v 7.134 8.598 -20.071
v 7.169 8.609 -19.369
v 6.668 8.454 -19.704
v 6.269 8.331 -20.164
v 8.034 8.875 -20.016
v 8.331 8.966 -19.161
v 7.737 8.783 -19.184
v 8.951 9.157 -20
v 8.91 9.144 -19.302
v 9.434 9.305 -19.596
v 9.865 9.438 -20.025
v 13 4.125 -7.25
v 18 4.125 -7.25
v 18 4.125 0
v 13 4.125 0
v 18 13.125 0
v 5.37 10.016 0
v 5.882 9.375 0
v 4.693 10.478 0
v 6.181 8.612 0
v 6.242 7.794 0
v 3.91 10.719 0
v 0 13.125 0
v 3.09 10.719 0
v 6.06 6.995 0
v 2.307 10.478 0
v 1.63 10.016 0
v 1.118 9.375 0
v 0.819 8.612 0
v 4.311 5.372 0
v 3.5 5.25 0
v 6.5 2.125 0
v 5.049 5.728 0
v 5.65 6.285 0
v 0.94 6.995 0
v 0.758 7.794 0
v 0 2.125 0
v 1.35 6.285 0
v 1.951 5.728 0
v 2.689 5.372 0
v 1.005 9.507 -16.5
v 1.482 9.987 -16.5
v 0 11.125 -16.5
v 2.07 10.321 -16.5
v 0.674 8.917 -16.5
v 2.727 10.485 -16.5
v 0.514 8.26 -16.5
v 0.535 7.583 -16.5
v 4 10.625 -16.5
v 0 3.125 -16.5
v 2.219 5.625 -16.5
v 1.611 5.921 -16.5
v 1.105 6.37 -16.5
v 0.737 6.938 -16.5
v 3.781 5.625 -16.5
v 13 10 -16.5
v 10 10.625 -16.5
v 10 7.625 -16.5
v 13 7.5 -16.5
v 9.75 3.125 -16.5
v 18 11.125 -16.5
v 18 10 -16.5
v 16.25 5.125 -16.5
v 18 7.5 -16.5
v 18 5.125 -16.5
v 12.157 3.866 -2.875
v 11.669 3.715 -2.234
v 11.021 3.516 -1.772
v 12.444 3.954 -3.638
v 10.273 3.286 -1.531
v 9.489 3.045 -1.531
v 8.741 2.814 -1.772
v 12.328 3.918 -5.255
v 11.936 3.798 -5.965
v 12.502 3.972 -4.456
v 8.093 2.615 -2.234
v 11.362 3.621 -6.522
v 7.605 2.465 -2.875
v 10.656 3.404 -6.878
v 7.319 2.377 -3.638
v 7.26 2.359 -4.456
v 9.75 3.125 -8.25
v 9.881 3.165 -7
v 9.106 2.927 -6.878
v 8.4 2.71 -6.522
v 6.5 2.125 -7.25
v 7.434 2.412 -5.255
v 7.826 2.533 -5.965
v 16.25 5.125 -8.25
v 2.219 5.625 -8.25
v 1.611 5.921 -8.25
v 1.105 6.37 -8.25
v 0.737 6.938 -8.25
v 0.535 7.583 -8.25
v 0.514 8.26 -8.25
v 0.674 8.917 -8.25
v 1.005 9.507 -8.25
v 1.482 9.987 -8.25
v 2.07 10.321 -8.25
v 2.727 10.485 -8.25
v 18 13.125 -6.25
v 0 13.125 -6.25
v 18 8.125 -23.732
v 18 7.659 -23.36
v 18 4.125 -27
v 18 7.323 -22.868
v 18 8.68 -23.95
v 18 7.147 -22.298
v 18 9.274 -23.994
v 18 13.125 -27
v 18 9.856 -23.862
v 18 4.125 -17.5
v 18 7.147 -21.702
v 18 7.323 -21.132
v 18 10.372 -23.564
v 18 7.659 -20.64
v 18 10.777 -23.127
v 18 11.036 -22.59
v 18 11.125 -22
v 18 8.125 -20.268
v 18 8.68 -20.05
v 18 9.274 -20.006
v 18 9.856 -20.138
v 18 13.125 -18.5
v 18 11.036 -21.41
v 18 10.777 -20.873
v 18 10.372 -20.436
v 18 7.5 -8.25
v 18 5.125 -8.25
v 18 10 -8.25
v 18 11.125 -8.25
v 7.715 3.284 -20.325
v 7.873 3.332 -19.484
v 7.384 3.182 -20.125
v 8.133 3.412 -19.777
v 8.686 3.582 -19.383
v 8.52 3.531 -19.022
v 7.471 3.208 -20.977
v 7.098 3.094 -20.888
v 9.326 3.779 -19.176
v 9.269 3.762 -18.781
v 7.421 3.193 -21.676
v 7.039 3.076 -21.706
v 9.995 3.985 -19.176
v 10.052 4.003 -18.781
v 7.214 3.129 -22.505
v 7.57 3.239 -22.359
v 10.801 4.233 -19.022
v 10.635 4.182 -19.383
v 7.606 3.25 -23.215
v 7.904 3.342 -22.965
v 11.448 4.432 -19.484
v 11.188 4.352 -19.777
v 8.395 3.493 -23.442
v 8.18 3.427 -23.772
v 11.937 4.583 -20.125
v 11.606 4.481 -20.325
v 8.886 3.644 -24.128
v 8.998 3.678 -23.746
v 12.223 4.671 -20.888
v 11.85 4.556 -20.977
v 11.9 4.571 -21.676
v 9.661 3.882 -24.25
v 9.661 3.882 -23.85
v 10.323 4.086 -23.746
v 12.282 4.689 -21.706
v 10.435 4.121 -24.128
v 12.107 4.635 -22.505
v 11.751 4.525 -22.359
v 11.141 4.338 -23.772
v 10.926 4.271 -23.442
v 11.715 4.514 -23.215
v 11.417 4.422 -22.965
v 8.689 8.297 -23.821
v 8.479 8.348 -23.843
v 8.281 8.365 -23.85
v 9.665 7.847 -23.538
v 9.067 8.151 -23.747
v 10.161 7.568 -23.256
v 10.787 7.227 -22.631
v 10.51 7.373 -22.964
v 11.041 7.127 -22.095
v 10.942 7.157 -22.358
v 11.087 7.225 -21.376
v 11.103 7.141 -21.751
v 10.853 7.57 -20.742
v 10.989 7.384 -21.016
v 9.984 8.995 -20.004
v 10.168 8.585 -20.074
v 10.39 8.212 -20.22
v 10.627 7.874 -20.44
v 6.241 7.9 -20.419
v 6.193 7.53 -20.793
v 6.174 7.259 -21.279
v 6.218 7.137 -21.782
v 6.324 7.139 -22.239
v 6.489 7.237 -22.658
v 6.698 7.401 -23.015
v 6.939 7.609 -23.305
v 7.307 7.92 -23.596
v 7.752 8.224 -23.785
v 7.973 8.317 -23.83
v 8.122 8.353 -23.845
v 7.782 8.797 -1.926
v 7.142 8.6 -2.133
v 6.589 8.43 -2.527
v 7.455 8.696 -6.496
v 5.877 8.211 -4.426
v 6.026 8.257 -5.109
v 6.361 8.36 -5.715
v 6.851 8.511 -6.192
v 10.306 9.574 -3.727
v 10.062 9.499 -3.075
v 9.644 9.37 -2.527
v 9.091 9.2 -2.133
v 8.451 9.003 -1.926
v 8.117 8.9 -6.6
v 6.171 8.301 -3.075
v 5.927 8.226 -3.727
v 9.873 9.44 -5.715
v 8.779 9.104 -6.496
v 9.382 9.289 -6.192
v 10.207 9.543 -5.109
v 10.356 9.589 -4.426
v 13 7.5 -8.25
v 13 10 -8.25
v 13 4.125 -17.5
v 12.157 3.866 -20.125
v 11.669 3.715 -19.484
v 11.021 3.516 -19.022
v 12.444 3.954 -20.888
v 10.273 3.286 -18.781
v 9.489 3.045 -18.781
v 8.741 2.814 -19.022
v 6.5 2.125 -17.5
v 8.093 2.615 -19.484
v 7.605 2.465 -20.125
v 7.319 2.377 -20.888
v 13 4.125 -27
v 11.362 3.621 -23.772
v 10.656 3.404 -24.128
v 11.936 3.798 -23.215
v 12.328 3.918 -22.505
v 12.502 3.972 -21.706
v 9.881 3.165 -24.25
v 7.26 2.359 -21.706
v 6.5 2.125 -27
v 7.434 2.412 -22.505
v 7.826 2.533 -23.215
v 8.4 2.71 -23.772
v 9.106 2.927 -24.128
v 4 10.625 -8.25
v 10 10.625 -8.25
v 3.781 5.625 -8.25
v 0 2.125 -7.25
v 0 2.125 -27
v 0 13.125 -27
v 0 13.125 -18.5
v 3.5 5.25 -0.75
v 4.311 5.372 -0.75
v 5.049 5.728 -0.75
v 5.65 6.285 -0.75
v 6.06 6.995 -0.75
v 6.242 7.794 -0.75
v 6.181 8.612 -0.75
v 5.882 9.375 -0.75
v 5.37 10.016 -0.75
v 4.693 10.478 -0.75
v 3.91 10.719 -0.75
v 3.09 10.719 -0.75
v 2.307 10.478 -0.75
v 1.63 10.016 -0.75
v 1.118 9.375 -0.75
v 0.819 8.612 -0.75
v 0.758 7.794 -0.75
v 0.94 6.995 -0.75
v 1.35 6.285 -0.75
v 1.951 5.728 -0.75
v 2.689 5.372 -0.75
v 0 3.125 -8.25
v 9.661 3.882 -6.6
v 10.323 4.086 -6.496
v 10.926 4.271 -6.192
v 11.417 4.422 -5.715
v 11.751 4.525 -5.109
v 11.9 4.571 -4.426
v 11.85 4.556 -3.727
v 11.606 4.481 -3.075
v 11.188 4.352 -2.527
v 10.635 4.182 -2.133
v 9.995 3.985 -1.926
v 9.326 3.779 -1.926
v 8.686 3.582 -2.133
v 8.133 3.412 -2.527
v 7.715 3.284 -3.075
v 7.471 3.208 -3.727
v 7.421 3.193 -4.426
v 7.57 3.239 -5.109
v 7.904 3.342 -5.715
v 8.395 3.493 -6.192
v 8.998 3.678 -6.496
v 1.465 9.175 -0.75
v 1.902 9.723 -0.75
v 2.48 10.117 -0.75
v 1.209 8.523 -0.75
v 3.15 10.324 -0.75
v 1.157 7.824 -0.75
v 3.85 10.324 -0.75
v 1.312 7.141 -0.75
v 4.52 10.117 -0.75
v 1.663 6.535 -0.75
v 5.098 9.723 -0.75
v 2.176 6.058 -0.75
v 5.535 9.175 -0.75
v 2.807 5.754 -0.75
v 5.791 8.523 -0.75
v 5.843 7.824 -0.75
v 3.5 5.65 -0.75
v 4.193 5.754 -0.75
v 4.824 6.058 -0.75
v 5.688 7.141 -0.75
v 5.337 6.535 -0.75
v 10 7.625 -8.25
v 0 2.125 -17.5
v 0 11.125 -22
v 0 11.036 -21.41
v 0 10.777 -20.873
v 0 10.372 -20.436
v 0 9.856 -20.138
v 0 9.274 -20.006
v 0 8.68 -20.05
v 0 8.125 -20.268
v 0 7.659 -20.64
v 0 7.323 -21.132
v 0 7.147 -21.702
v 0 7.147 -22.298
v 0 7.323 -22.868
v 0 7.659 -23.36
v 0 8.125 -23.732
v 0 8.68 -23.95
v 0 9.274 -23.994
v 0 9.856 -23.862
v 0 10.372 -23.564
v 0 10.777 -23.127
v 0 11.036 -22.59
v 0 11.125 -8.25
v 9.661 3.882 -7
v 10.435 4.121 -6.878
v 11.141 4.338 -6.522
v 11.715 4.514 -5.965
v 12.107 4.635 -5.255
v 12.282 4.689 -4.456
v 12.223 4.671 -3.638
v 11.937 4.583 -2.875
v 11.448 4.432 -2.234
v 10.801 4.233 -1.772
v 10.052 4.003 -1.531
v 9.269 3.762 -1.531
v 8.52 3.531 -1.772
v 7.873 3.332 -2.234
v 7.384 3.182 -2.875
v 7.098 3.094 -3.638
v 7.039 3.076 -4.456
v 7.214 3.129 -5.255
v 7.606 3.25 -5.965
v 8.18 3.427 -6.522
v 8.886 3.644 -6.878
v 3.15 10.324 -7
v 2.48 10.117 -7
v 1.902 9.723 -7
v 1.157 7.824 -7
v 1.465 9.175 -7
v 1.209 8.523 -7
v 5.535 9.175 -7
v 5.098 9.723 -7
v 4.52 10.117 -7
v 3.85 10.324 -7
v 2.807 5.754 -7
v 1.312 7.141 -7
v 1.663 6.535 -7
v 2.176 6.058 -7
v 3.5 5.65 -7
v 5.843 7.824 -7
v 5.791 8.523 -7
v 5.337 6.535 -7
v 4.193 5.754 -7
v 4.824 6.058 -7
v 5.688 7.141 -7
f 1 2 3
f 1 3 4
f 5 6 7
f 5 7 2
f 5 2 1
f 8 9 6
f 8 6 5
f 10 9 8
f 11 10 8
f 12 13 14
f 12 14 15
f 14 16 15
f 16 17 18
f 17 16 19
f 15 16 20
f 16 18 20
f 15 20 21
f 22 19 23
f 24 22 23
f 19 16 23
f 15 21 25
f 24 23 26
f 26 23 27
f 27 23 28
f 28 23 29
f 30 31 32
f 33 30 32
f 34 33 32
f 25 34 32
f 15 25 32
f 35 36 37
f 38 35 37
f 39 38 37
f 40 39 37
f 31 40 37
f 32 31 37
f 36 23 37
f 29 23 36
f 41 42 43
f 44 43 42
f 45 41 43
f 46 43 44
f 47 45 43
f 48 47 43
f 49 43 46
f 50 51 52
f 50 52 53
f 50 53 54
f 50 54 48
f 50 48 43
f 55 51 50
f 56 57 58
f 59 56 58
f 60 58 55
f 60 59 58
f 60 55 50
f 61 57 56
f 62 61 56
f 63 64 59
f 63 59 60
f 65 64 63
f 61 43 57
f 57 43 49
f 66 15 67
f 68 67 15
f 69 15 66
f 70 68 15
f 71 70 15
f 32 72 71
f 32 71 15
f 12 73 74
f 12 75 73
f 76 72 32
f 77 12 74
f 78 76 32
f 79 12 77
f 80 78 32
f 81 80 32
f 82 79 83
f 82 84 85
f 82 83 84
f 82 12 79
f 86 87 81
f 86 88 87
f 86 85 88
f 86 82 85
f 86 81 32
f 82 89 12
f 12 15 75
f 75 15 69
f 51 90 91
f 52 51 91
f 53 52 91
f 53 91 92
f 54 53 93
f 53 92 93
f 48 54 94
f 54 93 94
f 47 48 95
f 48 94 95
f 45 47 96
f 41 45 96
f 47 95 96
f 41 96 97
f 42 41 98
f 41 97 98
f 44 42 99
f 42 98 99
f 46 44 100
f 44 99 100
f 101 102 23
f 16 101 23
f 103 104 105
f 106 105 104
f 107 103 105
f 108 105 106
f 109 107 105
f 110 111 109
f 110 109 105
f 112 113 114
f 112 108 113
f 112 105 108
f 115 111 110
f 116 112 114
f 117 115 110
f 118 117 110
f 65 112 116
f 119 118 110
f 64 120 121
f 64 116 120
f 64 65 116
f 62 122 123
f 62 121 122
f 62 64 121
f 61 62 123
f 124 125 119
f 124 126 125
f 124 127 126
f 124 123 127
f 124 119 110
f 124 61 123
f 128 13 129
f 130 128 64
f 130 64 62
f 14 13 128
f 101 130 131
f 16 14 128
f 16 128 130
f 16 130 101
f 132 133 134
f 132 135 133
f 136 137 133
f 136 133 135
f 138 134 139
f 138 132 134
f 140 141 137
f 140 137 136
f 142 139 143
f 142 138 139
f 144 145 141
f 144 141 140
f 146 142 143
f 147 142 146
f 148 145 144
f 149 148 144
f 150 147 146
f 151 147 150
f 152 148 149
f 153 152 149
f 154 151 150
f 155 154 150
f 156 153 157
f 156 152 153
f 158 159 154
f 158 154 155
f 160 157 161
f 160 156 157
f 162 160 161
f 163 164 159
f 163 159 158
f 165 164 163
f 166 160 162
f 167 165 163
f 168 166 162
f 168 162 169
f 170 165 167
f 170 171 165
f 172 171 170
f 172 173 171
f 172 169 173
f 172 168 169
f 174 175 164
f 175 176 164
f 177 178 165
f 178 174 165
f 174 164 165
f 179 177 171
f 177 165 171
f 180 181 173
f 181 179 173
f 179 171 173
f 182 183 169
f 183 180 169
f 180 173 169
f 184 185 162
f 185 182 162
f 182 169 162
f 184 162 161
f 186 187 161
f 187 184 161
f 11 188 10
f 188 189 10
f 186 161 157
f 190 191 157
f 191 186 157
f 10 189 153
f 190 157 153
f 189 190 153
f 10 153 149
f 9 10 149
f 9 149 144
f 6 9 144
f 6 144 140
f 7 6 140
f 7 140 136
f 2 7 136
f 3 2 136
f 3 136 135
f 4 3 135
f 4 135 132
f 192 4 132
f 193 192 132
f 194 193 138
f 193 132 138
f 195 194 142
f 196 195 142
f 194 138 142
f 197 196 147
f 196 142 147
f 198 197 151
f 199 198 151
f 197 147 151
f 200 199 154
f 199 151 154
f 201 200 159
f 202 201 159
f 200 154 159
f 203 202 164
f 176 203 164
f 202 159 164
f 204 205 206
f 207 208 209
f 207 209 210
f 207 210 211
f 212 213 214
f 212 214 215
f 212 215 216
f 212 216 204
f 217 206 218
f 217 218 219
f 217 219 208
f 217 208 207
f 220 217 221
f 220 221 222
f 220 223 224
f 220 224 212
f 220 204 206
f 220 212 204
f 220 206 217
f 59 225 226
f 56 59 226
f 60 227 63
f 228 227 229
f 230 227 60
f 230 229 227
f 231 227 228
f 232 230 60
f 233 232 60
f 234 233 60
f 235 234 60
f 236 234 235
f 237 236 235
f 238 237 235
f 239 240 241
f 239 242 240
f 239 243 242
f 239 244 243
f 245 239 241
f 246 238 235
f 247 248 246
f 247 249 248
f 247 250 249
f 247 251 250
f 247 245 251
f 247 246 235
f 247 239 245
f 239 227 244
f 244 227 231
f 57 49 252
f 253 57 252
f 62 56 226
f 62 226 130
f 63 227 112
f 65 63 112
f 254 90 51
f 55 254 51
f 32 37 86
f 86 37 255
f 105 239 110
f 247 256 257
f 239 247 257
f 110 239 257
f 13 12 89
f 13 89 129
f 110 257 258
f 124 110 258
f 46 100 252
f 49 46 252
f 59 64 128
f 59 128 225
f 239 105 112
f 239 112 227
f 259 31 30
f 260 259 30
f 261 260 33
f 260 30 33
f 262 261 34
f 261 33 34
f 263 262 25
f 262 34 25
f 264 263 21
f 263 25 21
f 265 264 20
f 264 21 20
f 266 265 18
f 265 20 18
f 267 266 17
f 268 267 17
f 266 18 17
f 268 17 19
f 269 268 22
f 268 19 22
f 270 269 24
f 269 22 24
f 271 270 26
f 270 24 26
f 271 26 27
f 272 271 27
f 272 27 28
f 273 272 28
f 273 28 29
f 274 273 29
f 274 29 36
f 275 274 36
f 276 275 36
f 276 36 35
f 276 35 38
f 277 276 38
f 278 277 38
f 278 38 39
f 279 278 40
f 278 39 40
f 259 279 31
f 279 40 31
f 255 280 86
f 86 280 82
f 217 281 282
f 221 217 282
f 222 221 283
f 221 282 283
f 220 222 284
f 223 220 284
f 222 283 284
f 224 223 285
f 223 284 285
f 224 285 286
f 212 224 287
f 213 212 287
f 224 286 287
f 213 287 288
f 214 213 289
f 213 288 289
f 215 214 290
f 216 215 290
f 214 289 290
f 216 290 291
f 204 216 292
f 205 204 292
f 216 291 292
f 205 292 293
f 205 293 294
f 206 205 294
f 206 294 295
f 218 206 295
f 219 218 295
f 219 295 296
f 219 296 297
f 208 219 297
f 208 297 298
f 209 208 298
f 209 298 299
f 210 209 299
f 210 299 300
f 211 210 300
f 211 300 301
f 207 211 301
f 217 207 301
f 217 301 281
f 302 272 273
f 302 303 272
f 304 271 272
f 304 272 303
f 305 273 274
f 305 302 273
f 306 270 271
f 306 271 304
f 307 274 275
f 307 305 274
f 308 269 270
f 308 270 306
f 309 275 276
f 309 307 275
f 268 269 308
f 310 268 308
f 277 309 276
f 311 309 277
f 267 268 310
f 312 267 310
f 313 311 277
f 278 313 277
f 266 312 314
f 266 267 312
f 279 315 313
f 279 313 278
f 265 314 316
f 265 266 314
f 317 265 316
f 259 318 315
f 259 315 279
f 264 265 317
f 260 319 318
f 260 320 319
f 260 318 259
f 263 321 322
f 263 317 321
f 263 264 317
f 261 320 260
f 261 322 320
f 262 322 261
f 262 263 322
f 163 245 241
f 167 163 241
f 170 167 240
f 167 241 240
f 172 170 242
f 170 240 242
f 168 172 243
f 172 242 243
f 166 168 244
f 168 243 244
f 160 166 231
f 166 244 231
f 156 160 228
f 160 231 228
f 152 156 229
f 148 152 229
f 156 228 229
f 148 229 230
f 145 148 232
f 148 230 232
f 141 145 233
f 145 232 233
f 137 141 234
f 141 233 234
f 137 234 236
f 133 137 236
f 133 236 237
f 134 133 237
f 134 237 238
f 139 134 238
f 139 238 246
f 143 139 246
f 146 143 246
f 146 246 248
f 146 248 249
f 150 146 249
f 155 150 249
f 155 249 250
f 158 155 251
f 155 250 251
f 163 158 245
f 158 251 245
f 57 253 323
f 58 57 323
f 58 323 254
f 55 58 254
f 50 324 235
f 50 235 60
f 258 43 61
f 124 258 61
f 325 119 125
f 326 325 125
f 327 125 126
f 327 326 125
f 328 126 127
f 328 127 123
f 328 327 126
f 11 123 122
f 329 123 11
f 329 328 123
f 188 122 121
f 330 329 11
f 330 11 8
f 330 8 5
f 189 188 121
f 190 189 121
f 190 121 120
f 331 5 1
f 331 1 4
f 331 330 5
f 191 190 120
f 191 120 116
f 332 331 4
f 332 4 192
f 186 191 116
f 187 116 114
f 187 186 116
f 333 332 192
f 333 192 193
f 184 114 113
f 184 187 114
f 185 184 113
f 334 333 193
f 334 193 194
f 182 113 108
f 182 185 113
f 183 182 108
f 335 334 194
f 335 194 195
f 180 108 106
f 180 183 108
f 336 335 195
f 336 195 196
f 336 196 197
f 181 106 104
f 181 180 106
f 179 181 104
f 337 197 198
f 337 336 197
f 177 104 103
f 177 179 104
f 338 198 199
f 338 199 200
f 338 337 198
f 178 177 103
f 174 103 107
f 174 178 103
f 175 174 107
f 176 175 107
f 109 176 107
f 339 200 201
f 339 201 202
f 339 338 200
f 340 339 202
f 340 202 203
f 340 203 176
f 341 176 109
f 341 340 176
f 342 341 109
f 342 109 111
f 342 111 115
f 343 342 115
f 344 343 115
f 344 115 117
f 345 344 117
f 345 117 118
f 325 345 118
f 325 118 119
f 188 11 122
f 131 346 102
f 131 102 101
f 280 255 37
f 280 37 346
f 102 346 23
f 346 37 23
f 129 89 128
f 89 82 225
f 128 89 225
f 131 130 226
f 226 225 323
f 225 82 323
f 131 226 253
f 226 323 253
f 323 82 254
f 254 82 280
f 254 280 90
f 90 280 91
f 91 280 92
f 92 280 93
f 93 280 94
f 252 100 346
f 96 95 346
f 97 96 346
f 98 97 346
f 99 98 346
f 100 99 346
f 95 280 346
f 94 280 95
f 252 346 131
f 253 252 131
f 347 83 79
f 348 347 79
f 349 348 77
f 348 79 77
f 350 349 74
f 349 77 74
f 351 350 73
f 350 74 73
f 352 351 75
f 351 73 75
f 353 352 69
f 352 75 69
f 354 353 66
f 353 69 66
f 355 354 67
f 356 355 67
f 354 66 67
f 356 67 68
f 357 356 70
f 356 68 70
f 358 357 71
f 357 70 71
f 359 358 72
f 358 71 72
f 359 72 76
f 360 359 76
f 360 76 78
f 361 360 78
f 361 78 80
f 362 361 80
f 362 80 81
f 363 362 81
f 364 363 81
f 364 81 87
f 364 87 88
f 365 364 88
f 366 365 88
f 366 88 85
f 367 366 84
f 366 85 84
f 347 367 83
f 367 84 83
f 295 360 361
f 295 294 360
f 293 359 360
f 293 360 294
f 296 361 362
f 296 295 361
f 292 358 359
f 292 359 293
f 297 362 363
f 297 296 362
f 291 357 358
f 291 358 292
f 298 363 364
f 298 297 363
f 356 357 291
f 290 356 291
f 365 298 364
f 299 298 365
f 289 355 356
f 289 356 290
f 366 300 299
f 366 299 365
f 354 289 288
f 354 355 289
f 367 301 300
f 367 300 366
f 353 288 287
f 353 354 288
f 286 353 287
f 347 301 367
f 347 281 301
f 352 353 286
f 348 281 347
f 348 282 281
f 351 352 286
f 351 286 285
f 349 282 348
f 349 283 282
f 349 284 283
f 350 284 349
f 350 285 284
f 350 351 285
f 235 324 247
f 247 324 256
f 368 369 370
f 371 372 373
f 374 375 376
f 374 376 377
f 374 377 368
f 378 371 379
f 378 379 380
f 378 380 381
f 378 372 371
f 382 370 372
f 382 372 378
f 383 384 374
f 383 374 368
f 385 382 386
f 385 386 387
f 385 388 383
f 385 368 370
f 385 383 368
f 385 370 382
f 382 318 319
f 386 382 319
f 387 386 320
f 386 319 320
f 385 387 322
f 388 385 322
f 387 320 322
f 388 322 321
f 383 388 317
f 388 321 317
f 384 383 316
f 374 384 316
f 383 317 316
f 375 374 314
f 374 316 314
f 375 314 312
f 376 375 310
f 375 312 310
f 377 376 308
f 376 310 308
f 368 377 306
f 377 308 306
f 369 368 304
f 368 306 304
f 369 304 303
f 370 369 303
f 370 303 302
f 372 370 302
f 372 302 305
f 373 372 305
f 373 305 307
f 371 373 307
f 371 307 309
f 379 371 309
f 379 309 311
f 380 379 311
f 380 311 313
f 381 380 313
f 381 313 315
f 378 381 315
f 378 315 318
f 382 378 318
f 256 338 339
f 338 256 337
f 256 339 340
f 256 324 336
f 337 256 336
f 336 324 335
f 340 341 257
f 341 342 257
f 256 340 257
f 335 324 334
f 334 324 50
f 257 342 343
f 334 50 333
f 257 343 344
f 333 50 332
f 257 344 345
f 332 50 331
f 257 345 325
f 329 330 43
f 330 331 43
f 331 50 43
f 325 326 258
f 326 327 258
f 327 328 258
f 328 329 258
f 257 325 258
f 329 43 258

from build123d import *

# Parameters (mm, degrees)
SKETCH_R           = 2
PAD_DEPTH          = 18
POCKET_DEPTH       = 8.25
POCKET007002_DEPTH = 27.001
SKETCH003_R        = 2.35
POCKET007003_DEPTH = 6
SKETCH004_R        = 2.35
POCKET007004_DEPTH = 7
SKETCH005_R        = 2.75
POCKET007005_DEPTH = 0.75
SKETCH006_R        = 2.75
POCKET007006_DEPTH = 0.75
CHAMFER_SIZE       = 1
CHAMFER001_SIZE    = 2


with BuildPart() as part:
    # Sketch → Pad (new body)
    with BuildSketch(Plane.YZ):
        Polygon((2.125, 0), (2.125, -8.25), (5.625, -8.25), (5.625, -16.5), (2.125, -16.5), (2.125, -27), (13.125, -27), (13.125, -16.5), (10.625, -16.5), (10.625, -8.25), (13.125, -8.25), (13.125, 0), align=None)
        with Locations((9.125, -22)):
            Circle(SKETCH_R, mode=Mode.SUBTRACT)
    extrude(amount=PAD_DEPTH)

    # Sketch001 (on Face10 of Pad) → Pocket (cut)
    with BuildSketch(Plane.YX.offset(8.25)):
        with BuildLine():
            Line((2.125, 18), (7.5, 18))
            Line((7.5, 18), (7.5, 13))
            Line((7.5, 13), (10, 13))
            Line((10, 13), (10, 18))
            Line((10, 18), (10.625, 18))
            Line((10.625, 18), (10.625, 10))
            Line((10.625, 10), (7.625, 10))
            Line((7.625, 10), (5.6200366733, 3.7653591075))
            ThreePointArc((5.6200366733, 3.7653591075), (7.4780711036, 0.5550889122), (10.4850277531, 2.7268021481))
            Line((10.4850277531, 2.7268021481), (10.625, 4))
            Line((10.625, 4), (10.625, 0))
            Line((10.625, 0), (2.125, 0))
            Line((2.125, 0), (2.125, 18))
        make_face()
    extrude(amount=POCKET_DEPTH, mode=Mode.SUBTRACT)

    # Sketch002 (on Face8 of Pocket) → Pocket007002 (cut, through all)
    with BuildSketch(Plane.YX.offset(27)):
        Polygon((2.125, 18), (4.125, 18), (4.125, 13), (2.125, 6.5), align=None)
    extrude(amount=-POCKET007002_DEPTH, mode=Mode.SUBTRACT)

    # Sketch003 (on Face23 of Pocket007002) → Pocket007003 (cut)
    with BuildSketch(Plane(origin=(-0.0351351351, 0.1141891892, 0), x_dir=(0, 0, -1), z_dir=(0.2940858488, -0.9557790087, 0))):
        with Locations((4.25, 10.375)):
            Circle(SKETCH003_R)
        with Locations((21.5, 10.375)):
            Circle(SKETCH003_R)
    extrude(amount=-POCKET007003_DEPTH, mode=Mode.SUBTRACT)

    # Sketch004 (on Face5 of Pocket007003) → Pocket007004 (cut)
    with BuildSketch(Plane(origin=(0, 0, 0), x_dir=(0, -1, 0), z_dir=(0, 0, 1))):
        with Locations((-8, 3.5)):
            Circle(SKETCH004_R)
    extrude(amount=-POCKET007004_DEPTH, mode=Mode.SUBTRACT)

    # Sketch005 (on Face5 of Pocket007004) → Pocket007005 (cut)
    with BuildSketch(Plane(origin=(0, 0, 0), x_dir=(0, -1, 0), z_dir=(0, 0, 1))):
        with Locations((-8, 3.5)):
            Circle(SKETCH005_R)
    extrude(amount=-POCKET007005_DEPTH, mode=Mode.SUBTRACT)

    # Sketch006 (on Face4 of Pocket007005) → Pocket007006 (cut)
    with BuildSketch(Plane(origin=(-0.0351351351, 0.1141891892, 0), x_dir=(0, 0, -1), z_dir=(0.2940858488, -0.9557790087, 0))):
        with Locations((21.5, 10.375)):
            Circle(SKETCH006_R)
        with Locations((4.25, 10.375)):
            Circle(SKETCH006_R)
    extrude(amount=-POCKET007006_DEPTH, mode=Mode.SUBTRACT)

    # Chamfer
    chamfer_edges = [part.edges().sort_by_distance(p)[0] for p in [
        (3.25, 2.125, -16.5),
        (3.25, 2.125, -8.25),
        (15.5, 4.125, -8.25),
        (15.5, 4.125, -16.5),
    ]]
    chamfer(chamfer_edges, length=CHAMFER_SIZE)

    # Chamfer001
    chamfer001_edges = [part.edges().sort_by_distance(p)[0] for p in [
        (9, 13.125, -16.5),
        (9, 13.125, -8.25),
    ]]
    chamfer(chamfer001_edges, length=CHAMFER001_SIZE)


solid = part.part
